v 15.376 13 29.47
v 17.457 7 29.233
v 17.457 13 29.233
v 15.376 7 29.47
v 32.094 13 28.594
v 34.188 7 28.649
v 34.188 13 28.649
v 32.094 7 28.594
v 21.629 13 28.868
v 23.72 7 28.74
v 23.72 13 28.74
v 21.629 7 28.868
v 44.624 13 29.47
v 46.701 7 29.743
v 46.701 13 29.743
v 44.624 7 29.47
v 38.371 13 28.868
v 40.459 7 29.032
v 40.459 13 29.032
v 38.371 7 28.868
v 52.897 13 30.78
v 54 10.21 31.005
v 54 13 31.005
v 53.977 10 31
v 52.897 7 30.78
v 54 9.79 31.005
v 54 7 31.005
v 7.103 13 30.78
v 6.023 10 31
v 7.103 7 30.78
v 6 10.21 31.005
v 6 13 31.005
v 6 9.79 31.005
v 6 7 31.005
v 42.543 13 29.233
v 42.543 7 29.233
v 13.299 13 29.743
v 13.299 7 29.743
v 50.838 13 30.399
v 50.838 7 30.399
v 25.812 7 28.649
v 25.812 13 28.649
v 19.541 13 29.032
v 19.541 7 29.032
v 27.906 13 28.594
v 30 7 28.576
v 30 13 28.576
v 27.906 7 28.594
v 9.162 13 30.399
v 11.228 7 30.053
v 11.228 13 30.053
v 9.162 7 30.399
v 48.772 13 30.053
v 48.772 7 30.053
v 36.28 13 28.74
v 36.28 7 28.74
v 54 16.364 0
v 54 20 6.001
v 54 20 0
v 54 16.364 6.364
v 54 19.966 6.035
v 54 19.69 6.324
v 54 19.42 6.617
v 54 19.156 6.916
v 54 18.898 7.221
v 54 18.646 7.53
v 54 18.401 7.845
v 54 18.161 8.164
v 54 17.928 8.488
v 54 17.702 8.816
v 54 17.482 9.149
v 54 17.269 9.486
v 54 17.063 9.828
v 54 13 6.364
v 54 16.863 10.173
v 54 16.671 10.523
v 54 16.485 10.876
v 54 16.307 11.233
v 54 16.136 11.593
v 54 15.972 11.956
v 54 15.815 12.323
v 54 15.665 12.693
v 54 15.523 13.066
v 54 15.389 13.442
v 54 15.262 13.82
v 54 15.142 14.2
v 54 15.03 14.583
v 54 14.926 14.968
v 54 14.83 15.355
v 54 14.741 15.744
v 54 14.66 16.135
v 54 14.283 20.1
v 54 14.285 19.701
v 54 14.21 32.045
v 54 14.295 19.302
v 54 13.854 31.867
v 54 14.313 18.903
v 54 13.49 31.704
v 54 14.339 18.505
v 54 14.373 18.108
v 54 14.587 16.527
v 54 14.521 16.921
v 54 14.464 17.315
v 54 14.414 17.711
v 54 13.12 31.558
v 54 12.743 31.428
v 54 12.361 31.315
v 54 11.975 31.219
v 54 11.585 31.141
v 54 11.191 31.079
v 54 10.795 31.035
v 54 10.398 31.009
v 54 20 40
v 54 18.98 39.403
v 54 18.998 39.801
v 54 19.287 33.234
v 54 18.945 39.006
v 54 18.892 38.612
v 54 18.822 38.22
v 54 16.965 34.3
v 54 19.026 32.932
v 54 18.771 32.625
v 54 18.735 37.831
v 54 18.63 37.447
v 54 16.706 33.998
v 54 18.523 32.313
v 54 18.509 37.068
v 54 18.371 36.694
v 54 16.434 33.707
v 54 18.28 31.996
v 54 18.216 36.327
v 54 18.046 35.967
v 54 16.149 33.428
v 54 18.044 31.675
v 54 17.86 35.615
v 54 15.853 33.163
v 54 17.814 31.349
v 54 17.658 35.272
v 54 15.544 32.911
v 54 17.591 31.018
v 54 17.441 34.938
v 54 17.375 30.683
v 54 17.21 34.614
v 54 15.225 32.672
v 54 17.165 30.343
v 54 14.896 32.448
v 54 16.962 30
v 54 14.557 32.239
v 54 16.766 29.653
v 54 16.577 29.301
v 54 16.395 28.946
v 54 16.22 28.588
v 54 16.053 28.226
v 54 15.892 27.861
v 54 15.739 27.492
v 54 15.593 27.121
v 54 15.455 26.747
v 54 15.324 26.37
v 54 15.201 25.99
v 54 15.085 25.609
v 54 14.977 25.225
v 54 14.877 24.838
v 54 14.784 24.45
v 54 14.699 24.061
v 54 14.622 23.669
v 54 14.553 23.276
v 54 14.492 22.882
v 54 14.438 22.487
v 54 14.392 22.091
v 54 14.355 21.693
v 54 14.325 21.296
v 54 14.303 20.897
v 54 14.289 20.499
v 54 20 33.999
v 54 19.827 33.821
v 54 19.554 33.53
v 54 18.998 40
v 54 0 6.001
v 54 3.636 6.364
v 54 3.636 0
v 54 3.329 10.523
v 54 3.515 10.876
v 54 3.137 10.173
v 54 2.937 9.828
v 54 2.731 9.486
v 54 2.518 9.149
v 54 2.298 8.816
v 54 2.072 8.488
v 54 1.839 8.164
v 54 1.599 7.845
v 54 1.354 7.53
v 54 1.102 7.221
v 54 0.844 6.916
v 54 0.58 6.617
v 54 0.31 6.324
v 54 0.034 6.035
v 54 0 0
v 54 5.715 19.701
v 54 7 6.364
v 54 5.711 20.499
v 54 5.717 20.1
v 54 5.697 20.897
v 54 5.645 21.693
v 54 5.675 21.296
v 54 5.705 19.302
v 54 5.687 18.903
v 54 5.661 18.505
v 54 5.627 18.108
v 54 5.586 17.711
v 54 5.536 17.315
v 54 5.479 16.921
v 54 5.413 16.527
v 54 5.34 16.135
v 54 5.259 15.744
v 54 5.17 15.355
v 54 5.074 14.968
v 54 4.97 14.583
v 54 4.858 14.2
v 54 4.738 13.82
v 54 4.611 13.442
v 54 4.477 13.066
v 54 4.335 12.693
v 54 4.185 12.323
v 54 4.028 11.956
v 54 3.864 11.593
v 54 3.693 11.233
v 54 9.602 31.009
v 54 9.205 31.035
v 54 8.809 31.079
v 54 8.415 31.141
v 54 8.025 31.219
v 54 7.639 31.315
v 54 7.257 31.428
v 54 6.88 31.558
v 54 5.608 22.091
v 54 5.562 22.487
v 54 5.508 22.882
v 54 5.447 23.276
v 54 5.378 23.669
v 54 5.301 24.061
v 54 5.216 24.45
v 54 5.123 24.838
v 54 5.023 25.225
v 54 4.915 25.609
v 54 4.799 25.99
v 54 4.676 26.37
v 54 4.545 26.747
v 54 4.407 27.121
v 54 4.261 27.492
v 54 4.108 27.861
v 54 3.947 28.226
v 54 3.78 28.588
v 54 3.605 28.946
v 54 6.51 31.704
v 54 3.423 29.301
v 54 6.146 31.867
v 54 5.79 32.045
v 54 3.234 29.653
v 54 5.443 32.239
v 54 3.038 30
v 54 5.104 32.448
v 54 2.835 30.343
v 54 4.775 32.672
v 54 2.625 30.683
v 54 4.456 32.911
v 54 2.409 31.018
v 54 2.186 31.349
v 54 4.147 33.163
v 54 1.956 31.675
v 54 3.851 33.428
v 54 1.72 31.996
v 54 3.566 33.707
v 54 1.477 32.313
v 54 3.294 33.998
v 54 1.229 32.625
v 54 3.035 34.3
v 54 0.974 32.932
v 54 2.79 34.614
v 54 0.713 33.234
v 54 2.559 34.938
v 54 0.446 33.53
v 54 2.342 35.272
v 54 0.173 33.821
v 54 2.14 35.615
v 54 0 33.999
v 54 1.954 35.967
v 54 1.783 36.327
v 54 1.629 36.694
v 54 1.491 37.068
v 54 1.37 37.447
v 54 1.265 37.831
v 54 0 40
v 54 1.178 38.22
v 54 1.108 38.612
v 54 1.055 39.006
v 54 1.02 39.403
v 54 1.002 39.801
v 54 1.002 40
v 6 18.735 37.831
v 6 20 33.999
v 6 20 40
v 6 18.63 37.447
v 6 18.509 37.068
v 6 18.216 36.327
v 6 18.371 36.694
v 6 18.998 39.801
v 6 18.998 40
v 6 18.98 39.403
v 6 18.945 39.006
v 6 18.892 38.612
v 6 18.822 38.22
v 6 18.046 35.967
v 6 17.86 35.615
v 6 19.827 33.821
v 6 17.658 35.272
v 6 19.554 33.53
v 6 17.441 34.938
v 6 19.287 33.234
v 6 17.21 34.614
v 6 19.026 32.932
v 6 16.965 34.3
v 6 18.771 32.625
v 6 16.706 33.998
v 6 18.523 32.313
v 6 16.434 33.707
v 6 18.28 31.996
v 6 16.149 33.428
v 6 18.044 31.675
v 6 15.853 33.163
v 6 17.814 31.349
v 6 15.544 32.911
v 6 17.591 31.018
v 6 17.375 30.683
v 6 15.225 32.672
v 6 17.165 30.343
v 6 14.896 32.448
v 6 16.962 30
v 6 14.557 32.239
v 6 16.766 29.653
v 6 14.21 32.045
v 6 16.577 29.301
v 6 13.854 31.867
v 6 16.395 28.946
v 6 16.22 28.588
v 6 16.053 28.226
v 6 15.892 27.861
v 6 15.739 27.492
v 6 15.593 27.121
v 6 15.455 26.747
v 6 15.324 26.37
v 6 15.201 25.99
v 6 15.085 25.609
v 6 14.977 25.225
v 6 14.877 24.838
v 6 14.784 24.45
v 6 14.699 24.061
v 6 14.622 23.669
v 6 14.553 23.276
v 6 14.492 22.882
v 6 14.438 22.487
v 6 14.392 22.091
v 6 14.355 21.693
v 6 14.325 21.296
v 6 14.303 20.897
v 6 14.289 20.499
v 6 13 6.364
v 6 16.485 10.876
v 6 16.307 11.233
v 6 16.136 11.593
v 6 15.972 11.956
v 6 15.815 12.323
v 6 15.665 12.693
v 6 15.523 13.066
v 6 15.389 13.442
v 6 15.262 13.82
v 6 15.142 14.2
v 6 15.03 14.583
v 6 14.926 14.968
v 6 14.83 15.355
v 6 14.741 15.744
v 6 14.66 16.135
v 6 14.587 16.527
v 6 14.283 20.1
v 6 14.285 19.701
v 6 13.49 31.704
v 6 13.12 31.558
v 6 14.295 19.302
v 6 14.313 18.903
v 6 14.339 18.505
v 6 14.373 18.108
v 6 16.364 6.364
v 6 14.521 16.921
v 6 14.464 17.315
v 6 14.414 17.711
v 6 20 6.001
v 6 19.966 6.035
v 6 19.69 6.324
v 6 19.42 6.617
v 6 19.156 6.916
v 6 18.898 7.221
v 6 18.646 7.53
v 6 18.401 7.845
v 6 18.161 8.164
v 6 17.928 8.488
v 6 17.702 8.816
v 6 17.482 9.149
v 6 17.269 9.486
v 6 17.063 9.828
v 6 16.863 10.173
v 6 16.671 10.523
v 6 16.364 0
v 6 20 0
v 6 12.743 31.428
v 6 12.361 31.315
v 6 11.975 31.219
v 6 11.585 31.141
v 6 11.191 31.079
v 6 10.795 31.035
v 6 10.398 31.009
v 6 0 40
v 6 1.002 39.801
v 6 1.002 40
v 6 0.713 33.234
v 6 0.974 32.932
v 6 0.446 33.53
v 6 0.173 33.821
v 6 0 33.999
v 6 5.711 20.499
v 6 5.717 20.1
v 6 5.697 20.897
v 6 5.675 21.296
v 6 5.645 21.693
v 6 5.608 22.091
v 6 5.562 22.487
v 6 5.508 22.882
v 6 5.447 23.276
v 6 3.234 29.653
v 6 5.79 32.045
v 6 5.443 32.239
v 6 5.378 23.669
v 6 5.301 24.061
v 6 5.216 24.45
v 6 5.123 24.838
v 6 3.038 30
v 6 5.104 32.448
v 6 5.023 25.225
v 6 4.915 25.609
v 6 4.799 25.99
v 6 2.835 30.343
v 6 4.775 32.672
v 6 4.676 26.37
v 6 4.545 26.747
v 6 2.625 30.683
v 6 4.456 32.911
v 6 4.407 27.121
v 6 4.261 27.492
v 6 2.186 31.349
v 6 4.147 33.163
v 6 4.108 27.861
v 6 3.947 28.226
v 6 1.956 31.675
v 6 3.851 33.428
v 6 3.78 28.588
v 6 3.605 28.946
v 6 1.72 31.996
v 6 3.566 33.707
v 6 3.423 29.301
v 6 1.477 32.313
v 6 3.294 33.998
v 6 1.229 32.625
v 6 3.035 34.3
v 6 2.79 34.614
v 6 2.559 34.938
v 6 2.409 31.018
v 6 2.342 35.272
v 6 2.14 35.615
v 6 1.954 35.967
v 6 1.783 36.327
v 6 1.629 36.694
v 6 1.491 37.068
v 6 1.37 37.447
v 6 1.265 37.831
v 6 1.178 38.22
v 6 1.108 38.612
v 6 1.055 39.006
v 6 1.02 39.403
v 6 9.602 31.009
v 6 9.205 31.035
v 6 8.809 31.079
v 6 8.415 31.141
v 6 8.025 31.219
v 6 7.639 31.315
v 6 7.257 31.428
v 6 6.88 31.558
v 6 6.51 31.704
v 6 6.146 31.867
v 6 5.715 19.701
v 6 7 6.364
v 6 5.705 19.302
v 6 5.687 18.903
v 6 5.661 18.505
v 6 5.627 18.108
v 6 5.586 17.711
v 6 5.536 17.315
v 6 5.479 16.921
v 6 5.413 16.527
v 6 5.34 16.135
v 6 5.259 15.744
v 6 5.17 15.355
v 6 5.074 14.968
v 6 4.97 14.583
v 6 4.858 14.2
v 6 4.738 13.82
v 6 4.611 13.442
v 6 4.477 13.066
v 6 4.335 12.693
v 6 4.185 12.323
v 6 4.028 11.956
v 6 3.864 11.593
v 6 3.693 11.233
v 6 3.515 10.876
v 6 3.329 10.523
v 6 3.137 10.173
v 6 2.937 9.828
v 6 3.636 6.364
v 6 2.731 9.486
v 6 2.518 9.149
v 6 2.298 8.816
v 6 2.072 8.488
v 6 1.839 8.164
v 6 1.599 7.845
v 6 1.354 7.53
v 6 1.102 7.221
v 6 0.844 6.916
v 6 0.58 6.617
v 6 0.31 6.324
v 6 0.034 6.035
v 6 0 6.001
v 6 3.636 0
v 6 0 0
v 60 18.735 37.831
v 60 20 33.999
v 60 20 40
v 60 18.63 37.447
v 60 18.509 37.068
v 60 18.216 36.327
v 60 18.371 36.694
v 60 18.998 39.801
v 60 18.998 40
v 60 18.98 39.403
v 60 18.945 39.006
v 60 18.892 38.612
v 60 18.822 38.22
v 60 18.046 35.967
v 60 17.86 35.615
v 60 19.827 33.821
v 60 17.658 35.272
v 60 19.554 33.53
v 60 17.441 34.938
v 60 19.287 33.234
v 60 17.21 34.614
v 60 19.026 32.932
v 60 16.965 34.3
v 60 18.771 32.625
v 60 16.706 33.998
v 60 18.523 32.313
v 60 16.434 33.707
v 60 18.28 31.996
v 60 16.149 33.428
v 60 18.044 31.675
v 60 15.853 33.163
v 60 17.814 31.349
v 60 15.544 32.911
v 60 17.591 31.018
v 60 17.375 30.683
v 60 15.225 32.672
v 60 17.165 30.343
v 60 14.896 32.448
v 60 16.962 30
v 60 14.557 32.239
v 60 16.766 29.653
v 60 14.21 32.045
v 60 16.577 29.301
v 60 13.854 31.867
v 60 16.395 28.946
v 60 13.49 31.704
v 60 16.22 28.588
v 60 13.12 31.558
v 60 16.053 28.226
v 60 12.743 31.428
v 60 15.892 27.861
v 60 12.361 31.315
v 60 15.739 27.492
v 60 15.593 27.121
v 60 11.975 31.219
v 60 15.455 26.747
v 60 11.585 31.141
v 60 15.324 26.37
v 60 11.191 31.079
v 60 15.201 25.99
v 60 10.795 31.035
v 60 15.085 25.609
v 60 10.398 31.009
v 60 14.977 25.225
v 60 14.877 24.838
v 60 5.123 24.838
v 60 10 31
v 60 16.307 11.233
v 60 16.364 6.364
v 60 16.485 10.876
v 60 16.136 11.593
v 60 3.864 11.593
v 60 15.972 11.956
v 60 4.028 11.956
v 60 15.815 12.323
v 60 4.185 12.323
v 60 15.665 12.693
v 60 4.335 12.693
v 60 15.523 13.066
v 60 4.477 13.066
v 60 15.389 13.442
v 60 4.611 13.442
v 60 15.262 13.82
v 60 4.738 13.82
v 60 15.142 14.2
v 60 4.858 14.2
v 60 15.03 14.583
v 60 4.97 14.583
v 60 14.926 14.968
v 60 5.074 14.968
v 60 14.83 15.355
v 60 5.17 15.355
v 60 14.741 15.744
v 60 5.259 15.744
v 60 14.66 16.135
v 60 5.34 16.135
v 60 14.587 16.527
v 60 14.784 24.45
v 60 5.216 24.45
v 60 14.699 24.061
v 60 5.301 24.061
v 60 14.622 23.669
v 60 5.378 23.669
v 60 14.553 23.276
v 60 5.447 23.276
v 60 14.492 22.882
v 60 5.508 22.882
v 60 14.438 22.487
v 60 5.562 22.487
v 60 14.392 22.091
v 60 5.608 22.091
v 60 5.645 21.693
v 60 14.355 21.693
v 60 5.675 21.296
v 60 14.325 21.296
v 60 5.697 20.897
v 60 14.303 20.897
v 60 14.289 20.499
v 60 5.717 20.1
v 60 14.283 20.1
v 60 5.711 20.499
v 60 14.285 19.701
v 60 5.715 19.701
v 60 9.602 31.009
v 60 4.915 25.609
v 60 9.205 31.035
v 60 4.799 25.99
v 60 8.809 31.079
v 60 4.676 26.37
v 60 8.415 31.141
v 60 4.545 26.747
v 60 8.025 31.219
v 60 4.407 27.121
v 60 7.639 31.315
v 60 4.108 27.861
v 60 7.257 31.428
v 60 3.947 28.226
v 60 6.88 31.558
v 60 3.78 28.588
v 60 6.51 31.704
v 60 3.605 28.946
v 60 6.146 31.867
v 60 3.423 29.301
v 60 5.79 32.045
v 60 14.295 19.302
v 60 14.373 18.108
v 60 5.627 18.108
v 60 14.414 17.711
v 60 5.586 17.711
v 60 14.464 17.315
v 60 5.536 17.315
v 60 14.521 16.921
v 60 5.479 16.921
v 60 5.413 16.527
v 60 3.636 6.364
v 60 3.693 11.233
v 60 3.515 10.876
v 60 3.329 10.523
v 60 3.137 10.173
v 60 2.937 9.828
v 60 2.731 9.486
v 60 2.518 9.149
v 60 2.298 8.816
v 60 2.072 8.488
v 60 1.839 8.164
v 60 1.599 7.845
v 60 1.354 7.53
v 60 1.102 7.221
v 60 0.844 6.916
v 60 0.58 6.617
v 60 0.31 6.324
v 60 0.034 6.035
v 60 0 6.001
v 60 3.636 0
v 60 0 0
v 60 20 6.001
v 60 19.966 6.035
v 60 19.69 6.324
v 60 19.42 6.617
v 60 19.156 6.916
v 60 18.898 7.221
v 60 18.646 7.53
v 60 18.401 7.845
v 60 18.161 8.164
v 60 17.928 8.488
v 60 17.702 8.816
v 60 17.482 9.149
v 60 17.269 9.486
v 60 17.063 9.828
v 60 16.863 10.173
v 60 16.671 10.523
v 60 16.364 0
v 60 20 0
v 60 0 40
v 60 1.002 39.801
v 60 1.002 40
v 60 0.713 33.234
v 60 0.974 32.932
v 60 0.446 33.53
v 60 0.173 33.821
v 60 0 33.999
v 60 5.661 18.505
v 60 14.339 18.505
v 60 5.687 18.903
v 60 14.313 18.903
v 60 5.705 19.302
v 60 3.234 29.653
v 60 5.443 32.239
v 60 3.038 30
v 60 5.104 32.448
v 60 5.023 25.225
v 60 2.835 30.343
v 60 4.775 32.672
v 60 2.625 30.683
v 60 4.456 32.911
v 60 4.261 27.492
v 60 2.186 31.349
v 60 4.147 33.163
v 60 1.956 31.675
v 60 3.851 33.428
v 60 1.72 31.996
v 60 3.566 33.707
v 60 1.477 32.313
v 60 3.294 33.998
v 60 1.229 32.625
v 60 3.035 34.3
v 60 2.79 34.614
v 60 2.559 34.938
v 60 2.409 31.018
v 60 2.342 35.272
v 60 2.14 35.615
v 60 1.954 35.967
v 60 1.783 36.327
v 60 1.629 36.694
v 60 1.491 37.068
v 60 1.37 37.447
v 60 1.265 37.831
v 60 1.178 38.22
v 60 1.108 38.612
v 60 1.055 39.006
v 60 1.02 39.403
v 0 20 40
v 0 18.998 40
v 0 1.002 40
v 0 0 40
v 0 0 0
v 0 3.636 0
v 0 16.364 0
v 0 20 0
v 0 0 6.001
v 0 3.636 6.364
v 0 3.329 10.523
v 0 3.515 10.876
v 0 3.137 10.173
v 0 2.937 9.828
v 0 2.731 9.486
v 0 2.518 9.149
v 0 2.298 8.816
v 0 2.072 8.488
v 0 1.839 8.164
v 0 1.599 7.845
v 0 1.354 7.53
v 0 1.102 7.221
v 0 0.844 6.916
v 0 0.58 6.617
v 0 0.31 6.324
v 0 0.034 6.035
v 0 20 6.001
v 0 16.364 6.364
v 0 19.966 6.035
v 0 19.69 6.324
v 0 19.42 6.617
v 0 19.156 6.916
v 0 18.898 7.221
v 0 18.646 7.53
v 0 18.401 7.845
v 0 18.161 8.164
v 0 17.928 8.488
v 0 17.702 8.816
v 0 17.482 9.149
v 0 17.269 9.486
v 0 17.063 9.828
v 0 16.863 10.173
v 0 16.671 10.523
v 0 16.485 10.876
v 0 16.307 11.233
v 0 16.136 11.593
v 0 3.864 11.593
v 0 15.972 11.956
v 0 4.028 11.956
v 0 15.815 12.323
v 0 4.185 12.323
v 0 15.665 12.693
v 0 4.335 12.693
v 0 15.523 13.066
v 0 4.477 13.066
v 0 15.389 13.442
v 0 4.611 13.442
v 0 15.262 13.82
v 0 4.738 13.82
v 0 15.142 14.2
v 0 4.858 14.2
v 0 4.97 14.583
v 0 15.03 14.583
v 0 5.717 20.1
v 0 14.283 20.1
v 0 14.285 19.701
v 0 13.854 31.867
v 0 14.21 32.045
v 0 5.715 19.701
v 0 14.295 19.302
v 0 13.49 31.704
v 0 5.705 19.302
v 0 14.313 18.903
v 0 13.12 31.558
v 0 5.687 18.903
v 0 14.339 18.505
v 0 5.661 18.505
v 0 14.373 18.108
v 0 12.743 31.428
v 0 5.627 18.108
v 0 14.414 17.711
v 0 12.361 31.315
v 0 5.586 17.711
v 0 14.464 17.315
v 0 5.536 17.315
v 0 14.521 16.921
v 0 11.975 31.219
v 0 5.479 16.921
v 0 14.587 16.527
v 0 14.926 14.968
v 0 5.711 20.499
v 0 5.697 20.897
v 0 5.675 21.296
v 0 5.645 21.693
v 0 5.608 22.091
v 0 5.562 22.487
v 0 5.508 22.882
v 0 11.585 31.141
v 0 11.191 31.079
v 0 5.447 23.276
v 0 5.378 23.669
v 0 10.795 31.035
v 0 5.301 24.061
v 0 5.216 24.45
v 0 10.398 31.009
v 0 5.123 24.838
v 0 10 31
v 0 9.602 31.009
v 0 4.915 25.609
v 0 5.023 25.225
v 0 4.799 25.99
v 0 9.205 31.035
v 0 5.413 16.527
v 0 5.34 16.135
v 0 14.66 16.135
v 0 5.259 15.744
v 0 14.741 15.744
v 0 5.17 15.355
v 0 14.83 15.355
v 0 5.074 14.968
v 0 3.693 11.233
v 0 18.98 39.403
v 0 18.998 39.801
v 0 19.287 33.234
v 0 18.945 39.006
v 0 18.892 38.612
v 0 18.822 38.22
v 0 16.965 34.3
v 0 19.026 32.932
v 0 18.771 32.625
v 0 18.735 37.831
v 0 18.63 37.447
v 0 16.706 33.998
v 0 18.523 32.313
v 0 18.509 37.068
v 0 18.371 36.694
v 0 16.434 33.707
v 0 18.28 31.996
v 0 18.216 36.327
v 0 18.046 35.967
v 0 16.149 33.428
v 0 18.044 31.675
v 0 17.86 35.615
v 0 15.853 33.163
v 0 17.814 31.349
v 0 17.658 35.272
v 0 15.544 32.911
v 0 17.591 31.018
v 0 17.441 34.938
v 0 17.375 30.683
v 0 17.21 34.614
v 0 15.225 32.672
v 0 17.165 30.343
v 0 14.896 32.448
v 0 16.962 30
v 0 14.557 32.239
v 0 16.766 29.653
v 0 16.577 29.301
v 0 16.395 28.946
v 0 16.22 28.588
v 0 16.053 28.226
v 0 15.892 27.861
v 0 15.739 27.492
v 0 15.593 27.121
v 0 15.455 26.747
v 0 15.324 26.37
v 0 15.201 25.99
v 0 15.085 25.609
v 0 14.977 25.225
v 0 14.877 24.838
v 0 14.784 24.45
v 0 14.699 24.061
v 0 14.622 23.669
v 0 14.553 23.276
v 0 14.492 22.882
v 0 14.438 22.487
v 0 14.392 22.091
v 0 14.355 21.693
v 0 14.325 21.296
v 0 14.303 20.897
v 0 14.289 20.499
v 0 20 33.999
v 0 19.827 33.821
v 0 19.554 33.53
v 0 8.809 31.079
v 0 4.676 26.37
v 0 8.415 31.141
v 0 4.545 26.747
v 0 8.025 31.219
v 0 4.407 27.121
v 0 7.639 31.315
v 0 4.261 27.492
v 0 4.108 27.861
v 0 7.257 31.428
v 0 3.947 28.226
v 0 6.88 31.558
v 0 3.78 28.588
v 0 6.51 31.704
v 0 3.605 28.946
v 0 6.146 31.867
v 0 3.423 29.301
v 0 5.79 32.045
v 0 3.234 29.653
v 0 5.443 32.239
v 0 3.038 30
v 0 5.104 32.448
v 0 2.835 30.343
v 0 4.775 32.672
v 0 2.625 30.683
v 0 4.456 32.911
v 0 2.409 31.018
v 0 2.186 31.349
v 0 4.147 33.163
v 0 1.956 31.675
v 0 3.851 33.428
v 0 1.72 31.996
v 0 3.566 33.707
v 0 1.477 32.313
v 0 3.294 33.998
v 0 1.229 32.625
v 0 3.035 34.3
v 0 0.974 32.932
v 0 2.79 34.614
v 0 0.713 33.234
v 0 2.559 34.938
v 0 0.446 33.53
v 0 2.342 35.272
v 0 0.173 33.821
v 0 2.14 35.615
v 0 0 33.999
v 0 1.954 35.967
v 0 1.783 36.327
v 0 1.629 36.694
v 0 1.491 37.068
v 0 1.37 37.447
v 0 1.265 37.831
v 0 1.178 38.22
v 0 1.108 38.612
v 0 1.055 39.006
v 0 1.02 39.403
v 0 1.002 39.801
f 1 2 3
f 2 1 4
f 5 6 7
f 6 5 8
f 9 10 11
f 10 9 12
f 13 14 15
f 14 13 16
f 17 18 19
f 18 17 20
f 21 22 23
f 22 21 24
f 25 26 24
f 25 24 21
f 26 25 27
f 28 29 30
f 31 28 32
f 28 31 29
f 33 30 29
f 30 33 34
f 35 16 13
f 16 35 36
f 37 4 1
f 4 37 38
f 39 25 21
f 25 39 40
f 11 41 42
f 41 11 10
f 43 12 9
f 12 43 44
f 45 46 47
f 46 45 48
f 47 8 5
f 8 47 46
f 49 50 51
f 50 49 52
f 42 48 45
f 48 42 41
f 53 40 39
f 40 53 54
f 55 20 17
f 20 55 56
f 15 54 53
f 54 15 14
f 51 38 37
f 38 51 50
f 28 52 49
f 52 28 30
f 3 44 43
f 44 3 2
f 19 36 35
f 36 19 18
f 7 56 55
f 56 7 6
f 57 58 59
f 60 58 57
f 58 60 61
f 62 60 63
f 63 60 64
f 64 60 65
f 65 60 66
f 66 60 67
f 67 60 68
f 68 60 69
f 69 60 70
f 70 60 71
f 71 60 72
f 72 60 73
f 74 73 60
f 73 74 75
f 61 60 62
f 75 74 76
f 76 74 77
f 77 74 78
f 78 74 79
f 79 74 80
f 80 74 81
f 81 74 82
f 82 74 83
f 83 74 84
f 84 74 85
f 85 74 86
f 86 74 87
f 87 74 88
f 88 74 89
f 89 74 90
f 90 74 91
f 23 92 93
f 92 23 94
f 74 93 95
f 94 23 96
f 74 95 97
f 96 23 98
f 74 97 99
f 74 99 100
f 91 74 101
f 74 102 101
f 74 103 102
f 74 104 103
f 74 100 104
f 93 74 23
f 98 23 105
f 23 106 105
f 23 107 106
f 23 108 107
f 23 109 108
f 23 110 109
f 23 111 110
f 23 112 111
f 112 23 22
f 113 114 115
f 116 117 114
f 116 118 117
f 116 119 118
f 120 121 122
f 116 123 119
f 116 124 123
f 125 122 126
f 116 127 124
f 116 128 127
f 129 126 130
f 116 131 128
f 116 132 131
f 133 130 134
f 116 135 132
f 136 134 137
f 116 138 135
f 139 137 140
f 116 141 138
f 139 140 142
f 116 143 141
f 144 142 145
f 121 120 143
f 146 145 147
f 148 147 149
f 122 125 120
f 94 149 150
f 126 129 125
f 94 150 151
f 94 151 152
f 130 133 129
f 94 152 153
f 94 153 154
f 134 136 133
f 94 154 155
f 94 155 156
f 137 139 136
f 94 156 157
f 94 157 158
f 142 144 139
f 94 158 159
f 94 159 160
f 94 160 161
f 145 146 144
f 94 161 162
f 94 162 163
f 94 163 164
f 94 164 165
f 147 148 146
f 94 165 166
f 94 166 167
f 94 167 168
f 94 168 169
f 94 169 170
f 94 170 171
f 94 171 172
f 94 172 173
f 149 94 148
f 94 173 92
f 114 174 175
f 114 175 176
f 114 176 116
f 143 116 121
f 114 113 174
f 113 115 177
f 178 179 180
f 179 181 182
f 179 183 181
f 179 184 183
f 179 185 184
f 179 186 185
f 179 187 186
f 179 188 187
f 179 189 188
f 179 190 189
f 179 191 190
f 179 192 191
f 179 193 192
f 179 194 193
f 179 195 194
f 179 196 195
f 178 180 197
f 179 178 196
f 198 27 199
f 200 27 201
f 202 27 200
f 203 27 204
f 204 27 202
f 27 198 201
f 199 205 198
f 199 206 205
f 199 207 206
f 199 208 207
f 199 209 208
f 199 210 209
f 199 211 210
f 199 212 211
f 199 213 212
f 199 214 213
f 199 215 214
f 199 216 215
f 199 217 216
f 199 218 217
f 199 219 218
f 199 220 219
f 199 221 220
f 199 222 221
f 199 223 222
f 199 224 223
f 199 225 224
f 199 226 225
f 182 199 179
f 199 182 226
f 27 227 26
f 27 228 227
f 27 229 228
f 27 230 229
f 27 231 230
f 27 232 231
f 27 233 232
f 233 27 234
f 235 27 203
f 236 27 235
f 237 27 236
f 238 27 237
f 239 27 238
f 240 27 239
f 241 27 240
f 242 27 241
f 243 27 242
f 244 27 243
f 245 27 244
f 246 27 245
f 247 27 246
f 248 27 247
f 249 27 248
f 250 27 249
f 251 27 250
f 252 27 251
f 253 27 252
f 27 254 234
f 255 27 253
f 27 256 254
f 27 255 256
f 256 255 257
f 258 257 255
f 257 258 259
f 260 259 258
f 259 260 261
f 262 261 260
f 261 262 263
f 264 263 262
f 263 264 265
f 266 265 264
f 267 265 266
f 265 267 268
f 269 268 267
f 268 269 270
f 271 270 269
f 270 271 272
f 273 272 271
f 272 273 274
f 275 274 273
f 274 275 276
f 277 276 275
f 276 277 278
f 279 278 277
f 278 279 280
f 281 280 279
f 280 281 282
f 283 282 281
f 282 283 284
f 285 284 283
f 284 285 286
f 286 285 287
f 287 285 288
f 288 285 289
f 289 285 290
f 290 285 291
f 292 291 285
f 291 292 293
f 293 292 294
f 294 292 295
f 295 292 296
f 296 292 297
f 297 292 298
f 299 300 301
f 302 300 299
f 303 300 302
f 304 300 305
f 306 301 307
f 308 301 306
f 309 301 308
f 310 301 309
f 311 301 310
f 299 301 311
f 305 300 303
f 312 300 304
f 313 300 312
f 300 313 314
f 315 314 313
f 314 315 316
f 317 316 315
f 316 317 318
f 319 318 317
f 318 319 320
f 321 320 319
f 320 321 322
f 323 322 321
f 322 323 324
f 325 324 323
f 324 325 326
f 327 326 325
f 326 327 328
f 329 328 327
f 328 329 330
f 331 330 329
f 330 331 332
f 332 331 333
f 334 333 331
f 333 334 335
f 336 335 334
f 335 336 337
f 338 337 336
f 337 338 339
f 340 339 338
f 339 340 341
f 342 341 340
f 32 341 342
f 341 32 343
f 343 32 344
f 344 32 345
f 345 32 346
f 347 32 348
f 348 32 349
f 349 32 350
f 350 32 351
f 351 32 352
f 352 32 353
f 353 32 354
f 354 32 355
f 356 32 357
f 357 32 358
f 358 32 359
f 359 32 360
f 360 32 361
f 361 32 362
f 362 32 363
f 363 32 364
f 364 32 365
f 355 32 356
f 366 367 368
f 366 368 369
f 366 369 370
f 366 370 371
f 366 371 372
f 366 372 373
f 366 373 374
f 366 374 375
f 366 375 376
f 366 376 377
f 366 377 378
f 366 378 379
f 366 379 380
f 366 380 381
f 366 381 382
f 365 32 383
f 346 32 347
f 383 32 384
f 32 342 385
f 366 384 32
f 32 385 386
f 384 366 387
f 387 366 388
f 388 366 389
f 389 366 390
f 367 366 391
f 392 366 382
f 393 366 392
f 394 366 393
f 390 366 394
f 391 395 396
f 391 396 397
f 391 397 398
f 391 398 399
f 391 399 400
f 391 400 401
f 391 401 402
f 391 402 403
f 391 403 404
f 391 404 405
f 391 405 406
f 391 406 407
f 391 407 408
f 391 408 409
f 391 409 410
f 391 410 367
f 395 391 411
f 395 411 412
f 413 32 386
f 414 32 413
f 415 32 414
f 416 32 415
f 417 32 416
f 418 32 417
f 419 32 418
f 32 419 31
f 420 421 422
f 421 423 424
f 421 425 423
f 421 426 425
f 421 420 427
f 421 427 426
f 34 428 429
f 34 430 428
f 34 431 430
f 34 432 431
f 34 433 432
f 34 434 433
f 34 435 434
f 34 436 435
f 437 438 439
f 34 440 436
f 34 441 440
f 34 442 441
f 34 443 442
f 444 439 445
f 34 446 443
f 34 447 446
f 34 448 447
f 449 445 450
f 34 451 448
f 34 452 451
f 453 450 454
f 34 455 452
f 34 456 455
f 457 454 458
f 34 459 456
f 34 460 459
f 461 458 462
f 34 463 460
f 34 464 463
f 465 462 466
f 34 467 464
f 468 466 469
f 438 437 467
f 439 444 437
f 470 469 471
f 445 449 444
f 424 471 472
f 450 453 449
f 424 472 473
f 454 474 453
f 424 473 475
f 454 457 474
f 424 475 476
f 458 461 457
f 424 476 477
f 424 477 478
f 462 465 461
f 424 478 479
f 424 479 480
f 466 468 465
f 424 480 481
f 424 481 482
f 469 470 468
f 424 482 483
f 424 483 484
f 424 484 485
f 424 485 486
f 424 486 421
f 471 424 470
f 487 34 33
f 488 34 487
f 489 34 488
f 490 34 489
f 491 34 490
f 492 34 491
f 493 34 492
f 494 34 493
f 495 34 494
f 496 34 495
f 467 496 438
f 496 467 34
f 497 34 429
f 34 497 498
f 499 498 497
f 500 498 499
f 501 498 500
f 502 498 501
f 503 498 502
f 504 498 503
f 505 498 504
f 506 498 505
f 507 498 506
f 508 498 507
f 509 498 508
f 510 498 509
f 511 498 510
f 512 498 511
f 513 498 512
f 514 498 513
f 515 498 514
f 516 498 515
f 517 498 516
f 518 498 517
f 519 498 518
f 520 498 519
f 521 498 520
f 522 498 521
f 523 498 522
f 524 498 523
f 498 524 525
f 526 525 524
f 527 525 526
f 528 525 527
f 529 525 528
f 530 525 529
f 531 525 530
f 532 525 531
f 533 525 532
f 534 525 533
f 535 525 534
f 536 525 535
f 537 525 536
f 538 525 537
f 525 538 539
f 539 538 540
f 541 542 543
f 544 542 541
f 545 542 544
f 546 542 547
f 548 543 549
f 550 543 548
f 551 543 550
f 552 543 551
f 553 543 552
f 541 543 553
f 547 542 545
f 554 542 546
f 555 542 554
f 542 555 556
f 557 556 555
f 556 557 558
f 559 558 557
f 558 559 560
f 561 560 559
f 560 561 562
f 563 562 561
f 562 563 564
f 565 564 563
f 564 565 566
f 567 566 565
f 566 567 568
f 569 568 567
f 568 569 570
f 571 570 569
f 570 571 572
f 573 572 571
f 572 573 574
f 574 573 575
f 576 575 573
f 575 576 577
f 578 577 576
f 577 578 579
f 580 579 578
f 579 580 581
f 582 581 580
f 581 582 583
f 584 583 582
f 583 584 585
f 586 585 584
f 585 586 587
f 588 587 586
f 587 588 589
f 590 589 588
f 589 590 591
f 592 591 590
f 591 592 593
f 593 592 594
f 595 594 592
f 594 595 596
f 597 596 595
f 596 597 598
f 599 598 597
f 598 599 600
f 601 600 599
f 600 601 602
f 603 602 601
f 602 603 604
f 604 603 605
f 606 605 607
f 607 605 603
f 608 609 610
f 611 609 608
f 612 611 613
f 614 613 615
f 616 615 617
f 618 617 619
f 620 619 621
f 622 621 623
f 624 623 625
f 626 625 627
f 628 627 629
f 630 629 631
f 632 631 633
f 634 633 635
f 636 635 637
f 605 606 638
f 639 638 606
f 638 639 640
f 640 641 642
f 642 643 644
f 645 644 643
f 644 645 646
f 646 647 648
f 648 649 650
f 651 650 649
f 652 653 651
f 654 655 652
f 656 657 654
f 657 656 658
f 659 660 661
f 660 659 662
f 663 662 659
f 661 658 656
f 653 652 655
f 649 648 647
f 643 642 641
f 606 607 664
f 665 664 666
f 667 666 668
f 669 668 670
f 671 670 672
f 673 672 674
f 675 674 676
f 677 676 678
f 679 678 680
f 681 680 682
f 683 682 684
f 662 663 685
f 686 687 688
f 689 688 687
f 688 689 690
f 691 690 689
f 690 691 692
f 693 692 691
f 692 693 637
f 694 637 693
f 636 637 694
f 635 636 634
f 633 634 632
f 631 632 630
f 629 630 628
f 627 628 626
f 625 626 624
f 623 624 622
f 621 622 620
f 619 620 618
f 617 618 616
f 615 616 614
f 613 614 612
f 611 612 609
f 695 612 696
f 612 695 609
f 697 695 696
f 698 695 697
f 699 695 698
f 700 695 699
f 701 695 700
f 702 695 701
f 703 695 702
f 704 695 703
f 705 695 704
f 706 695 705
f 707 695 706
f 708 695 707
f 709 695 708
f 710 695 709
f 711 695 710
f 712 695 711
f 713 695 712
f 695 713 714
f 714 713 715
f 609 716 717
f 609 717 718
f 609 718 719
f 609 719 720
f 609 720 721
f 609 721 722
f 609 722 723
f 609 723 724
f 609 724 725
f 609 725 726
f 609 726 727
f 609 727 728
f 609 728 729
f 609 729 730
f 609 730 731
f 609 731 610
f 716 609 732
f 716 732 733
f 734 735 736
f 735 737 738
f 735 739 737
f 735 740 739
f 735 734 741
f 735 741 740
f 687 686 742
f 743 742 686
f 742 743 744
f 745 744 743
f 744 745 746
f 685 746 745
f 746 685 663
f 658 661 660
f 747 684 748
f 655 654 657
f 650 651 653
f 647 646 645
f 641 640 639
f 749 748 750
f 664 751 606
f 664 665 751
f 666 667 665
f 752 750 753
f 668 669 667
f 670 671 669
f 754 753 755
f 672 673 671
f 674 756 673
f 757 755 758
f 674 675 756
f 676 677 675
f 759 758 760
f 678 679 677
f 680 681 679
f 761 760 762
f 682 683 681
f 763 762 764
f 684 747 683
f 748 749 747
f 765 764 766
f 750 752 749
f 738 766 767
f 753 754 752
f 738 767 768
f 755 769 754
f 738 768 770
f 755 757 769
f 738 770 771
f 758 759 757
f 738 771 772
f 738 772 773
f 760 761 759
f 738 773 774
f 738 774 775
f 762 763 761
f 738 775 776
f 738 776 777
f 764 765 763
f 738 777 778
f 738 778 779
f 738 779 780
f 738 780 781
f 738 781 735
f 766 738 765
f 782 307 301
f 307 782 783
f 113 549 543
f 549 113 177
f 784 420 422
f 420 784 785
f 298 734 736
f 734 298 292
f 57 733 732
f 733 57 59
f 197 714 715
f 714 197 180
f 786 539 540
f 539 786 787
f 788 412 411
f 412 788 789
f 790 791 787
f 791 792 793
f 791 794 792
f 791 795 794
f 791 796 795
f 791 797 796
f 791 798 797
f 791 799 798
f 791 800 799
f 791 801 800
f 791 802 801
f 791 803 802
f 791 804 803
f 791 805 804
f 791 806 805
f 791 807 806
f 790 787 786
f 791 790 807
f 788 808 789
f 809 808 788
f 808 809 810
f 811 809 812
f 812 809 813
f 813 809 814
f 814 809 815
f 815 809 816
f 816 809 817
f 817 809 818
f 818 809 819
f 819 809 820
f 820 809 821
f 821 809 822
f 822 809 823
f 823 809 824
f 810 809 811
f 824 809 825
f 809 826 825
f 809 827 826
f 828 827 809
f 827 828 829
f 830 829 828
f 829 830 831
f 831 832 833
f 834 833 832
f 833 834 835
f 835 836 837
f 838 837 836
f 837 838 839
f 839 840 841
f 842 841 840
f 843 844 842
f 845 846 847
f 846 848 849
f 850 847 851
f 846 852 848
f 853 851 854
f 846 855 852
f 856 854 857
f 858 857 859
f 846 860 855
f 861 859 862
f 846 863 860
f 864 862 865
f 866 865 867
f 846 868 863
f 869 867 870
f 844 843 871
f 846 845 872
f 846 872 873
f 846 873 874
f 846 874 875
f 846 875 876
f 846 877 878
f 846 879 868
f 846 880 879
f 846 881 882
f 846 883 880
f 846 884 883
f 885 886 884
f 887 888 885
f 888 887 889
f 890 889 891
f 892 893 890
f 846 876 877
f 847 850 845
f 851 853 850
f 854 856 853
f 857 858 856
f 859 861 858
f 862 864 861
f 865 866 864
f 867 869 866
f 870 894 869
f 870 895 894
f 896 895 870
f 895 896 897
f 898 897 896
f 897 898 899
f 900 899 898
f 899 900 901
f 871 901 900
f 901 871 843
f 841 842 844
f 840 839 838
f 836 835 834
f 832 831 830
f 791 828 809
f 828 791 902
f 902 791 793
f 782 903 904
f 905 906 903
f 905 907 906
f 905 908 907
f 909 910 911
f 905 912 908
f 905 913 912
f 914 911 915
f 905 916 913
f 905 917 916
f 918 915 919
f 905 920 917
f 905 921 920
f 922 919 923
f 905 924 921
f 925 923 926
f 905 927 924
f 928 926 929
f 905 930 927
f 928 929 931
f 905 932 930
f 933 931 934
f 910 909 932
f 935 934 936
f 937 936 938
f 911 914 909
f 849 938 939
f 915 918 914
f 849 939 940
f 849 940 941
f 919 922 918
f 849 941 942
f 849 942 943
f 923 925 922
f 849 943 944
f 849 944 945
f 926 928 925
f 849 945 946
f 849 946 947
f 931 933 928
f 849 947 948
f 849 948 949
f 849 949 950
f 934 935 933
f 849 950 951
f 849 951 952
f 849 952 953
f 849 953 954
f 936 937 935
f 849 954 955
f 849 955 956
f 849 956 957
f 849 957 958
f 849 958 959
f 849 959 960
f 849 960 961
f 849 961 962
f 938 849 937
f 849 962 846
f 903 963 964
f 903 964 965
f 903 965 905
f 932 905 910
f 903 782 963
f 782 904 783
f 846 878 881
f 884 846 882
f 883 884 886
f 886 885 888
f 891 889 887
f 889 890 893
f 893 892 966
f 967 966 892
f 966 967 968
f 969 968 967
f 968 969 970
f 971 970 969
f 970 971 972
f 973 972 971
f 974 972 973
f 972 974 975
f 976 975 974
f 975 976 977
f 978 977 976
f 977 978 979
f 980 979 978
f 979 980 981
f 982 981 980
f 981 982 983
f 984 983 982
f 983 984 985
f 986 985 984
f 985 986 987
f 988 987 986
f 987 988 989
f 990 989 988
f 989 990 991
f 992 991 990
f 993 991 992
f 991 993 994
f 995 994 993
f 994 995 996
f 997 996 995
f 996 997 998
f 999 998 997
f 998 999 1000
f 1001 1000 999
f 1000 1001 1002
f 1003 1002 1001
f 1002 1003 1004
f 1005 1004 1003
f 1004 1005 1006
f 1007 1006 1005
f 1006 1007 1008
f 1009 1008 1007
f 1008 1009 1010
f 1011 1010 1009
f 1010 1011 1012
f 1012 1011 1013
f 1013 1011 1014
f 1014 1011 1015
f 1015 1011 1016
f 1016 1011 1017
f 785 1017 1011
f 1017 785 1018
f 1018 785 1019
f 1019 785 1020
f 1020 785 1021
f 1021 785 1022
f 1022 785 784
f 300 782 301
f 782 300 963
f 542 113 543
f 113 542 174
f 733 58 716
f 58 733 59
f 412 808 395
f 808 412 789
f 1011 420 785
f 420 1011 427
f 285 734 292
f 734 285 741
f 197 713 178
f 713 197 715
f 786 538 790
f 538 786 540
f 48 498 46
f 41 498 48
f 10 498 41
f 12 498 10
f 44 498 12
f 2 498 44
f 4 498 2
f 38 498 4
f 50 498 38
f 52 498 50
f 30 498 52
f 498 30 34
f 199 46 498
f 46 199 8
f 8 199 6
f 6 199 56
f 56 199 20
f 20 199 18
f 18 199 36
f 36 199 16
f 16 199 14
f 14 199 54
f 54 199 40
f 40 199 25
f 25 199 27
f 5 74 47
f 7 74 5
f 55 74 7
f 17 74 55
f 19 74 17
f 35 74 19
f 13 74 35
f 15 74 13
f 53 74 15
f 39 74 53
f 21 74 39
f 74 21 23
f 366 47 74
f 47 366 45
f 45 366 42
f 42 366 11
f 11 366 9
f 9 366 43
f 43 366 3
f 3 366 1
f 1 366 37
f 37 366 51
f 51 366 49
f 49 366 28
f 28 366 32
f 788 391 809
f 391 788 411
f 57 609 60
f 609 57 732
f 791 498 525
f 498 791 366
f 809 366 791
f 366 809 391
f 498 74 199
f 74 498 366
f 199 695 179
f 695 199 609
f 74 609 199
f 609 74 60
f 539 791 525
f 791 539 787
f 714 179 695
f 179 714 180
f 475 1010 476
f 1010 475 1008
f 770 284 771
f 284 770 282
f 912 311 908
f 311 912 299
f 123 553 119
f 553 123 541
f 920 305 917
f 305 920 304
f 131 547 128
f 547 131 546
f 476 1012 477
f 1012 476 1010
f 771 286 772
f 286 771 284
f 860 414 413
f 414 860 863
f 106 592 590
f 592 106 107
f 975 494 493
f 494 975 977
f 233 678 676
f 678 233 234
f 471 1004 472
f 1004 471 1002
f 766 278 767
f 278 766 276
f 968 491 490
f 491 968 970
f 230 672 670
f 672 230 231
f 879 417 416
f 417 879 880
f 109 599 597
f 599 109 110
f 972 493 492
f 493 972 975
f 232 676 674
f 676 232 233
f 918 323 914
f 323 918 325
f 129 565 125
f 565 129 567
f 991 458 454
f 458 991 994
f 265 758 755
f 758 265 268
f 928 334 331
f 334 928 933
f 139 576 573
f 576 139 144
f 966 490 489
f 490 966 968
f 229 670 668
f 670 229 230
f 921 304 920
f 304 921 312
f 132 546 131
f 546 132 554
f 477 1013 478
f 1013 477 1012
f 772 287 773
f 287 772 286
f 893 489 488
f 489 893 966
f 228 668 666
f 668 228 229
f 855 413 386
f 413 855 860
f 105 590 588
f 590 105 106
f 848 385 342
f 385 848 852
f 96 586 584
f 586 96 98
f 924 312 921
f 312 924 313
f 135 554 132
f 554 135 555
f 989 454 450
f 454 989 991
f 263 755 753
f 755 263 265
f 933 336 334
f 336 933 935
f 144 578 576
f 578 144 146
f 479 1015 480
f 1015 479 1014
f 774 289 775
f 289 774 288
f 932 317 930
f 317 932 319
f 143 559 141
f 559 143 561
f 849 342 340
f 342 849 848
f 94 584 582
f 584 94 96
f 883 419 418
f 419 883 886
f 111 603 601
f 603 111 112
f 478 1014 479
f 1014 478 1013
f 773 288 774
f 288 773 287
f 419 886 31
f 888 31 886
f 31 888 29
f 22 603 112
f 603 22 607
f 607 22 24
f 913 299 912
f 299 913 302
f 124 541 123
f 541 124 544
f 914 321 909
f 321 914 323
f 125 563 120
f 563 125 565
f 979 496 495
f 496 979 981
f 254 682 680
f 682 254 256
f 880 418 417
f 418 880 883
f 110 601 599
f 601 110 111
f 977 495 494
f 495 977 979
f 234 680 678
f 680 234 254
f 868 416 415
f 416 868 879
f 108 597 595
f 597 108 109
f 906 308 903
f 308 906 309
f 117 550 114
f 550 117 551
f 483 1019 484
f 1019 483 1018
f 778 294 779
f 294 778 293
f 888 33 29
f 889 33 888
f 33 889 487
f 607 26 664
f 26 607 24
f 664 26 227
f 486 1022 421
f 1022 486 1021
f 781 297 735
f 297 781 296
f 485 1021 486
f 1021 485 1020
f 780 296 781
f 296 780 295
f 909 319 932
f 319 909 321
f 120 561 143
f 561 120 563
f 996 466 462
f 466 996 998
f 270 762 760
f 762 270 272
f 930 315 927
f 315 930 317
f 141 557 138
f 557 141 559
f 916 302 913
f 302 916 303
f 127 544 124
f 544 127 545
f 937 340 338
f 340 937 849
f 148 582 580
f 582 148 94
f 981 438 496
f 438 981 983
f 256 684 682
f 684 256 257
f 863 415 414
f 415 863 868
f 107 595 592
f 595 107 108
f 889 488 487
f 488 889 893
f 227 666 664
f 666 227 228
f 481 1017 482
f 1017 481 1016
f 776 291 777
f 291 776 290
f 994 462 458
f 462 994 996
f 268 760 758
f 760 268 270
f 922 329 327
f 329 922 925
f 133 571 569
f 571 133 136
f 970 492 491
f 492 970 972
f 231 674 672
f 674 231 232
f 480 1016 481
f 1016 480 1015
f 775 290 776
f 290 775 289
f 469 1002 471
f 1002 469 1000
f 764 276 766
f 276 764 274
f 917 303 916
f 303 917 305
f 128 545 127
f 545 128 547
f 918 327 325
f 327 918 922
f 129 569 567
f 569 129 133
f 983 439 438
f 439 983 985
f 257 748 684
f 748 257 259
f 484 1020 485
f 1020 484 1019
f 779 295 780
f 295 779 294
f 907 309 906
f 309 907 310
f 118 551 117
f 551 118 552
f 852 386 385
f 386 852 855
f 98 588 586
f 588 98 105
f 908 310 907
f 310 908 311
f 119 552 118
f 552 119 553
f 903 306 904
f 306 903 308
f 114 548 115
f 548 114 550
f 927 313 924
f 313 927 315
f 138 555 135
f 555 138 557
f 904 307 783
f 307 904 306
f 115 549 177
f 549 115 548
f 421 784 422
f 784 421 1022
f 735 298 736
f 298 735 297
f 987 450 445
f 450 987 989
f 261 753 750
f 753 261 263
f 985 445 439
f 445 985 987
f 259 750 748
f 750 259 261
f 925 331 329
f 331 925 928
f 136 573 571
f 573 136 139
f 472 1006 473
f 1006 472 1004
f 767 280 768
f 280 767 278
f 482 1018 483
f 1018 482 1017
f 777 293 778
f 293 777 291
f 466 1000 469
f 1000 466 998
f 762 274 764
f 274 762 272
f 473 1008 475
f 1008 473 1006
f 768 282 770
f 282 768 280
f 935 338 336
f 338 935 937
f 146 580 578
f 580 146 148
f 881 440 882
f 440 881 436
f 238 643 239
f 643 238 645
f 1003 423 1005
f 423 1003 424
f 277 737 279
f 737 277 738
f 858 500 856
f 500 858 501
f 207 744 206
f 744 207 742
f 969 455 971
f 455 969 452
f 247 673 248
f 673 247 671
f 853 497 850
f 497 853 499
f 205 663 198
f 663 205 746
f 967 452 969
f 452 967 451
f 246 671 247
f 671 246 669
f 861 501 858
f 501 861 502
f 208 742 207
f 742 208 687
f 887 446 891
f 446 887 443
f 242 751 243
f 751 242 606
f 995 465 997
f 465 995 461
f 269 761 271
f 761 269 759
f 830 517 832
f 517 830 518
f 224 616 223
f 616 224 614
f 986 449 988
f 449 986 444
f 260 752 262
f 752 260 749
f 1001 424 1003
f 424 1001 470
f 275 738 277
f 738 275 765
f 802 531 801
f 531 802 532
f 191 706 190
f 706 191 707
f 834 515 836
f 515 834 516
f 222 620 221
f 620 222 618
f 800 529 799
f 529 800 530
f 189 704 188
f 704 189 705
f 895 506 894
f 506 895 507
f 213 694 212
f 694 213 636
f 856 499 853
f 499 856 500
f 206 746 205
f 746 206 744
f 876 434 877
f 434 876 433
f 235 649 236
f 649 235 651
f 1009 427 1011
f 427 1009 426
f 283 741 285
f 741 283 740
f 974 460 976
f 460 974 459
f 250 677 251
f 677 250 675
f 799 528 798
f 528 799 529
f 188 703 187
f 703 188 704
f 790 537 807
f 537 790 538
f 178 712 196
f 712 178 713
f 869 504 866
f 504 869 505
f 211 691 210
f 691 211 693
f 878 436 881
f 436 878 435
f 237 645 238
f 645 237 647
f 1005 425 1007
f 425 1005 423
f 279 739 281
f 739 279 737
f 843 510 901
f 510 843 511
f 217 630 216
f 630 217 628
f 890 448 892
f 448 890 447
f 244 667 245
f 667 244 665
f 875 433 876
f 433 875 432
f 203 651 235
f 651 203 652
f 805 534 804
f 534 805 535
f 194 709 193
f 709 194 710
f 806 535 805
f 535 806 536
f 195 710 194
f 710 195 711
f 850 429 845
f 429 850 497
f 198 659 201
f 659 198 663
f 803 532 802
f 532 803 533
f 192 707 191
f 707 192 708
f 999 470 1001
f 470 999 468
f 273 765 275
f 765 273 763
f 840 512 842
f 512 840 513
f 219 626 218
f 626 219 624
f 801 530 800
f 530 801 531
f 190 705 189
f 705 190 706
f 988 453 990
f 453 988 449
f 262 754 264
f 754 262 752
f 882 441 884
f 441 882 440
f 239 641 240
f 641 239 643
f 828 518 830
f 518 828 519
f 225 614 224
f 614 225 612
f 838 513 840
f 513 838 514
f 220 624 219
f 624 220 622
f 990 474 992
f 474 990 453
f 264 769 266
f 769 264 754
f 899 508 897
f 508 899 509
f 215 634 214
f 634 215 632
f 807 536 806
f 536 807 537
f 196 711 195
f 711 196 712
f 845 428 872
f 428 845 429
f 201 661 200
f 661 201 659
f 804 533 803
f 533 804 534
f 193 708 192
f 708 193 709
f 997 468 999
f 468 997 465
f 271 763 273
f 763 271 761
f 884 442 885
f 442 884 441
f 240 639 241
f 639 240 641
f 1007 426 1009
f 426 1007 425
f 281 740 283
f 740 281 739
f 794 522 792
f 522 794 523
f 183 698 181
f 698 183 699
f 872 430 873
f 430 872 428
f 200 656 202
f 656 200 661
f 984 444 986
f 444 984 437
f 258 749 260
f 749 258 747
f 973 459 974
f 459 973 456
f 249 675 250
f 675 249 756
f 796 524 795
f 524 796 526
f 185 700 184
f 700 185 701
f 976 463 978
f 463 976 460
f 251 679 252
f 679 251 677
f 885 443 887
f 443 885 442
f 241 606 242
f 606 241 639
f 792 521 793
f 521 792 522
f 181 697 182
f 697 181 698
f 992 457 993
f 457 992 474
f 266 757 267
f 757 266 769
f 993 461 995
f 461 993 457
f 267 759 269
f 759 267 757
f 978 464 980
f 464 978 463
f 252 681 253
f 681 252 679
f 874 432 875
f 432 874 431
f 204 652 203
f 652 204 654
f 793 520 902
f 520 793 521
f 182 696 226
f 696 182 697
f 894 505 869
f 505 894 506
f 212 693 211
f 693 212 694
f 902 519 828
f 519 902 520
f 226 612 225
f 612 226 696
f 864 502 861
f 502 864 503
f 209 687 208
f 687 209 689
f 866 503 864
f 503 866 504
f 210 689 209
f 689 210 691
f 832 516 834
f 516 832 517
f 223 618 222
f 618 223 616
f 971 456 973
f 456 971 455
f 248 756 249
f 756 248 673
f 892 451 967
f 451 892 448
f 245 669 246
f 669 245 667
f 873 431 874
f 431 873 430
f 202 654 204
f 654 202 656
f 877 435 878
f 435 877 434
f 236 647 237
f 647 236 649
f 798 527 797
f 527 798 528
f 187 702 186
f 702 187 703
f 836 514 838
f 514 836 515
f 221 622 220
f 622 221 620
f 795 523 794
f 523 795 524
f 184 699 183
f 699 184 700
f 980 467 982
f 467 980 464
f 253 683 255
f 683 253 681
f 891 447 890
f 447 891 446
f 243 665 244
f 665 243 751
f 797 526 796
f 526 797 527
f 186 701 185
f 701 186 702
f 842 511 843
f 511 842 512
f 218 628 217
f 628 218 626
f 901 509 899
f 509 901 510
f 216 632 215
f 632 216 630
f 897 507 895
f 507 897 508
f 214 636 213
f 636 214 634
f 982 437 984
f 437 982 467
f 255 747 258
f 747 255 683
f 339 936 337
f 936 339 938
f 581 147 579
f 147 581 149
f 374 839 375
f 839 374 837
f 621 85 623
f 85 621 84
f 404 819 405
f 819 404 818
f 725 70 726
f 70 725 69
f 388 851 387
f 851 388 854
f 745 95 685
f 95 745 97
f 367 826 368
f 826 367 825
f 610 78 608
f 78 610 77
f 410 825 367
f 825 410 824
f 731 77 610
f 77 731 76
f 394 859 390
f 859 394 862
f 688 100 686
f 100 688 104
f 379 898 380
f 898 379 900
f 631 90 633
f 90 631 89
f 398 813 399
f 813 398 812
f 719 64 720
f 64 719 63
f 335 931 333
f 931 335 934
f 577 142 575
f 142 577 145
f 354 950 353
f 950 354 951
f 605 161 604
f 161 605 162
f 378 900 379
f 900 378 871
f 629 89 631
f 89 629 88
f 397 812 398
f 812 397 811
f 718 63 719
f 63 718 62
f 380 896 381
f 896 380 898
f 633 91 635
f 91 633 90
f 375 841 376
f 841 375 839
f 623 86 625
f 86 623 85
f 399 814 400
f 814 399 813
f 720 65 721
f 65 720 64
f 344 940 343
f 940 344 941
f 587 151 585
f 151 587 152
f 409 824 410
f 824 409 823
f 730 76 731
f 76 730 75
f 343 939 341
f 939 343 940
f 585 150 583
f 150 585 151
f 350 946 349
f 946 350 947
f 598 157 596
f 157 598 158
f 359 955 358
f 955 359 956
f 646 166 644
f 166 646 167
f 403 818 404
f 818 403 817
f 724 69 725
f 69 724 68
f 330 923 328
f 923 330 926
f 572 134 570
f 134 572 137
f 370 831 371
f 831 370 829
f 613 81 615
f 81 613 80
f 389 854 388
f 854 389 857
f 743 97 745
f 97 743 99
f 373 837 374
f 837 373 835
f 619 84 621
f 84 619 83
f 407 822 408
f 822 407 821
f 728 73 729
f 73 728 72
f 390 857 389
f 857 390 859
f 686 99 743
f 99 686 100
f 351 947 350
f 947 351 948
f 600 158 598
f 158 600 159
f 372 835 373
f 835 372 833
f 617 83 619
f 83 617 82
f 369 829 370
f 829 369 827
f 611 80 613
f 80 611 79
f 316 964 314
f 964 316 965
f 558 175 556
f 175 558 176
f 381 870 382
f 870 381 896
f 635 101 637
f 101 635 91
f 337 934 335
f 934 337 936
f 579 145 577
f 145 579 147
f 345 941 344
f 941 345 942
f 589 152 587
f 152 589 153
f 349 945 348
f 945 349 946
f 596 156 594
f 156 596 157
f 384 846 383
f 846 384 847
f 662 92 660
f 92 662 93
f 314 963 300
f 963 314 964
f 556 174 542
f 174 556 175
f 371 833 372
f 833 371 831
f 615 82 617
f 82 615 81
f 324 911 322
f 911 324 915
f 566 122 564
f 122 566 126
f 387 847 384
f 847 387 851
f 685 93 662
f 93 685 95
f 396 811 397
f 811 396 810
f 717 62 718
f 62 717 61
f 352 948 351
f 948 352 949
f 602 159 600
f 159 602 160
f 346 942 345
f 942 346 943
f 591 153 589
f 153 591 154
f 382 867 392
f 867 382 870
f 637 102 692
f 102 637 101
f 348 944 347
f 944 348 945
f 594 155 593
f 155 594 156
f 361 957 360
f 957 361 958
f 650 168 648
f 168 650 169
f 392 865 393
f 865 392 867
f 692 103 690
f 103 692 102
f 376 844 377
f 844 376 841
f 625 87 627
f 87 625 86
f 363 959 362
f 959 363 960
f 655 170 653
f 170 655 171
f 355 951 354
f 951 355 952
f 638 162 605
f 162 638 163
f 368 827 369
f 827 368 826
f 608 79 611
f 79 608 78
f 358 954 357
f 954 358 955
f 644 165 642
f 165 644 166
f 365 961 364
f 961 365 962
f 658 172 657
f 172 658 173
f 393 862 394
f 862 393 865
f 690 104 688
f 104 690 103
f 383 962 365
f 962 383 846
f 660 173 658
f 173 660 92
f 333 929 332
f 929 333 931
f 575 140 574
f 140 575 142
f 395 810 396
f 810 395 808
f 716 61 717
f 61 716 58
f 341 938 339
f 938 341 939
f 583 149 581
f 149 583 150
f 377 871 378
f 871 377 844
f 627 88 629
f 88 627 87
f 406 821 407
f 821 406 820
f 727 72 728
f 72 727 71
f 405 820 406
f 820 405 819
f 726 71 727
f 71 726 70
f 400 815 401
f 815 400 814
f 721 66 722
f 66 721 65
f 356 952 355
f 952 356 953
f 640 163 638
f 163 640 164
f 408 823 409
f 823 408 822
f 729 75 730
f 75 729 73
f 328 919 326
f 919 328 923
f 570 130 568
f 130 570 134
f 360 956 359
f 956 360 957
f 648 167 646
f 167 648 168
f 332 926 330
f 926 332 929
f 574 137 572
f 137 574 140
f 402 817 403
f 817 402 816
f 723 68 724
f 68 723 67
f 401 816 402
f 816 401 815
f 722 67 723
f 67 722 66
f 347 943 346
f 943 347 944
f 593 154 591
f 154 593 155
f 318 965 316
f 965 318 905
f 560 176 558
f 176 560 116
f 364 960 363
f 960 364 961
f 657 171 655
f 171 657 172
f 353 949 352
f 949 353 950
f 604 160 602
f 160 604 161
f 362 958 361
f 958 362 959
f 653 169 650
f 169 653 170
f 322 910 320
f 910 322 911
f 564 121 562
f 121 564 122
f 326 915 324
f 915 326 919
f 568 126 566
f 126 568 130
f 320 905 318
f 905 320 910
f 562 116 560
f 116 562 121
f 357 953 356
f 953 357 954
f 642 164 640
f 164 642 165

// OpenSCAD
length = 60;
width = 20;
height = 40;
thickness = 6;
leg_thickness = 1;
arc_height = 9; //Extra height at which the bottom arc starts.
arc_radius = length * 2;
arc_thickness = 22;
curve_radius = height / 2;
$fs = 0.4;
$fa = 1;

difference() {
	//Main volume we're carving from.
	cube([length, width, height]);

	intersection() {
		union() {
			//Top arc.
			translate([length / 2, -1, arc_radius + arc_height + arc_thickness - (1 - cos(asin((length / 2 - thickness) / arc_radius))) * arc_radius]) {
				rotate([-90, 0, 0]) {
					cylinder(r=arc_radius, h=width + 2);
				}
			}
		}
		translate([thickness, -2, -1]) {
			cube([length - thickness * 2, width + 4, height + 2]);
		}
	}

	//Arc sides.
	translate([thickness, -1, 0]) {
		cube([length - thickness * 2, (width - thickness) / 2 + 1, height]);
	}
	translate([thickness, (width + thickness) / 2, 0]) {
		cube([length - thickness * 2, (width - thickness) / 2 + 1, height]);
	}

	//Side legs.
	translate([-1, width / 2, 0]) {
		rotate([45, 0, 0]) {
			rotate([0, 90, 0]) {
				cylinder(r=width / 2 - leg_thickness, h=length + 2, $fn=4);
			}
		}
	}
	translate([-1, width / 2, height]) {
		rotate([0, 90, 0]) {
			cylinder(r=width / 2 - leg_thickness, h=length + 2);
		}
	}

	//Curves.
	translate([-1, -curve_radius + (1 - cos(asin((height / 2 - thickness) / curve_radius))) * curve_radius, height / 2]) {
		rotate([0, 90, 0]) {
			cylinder(r=curve_radius, h=length + 2);
		}
	}
	translate([-1, width + curve_radius - (1 - cos(asin((height / 2 - thickness) / curve_radius))) * curve_radius, height / 2]) {
		rotate([0, 90, 0]) {
			cylinder(r=curve_radius, h=length + 2);
		}
	}
}
